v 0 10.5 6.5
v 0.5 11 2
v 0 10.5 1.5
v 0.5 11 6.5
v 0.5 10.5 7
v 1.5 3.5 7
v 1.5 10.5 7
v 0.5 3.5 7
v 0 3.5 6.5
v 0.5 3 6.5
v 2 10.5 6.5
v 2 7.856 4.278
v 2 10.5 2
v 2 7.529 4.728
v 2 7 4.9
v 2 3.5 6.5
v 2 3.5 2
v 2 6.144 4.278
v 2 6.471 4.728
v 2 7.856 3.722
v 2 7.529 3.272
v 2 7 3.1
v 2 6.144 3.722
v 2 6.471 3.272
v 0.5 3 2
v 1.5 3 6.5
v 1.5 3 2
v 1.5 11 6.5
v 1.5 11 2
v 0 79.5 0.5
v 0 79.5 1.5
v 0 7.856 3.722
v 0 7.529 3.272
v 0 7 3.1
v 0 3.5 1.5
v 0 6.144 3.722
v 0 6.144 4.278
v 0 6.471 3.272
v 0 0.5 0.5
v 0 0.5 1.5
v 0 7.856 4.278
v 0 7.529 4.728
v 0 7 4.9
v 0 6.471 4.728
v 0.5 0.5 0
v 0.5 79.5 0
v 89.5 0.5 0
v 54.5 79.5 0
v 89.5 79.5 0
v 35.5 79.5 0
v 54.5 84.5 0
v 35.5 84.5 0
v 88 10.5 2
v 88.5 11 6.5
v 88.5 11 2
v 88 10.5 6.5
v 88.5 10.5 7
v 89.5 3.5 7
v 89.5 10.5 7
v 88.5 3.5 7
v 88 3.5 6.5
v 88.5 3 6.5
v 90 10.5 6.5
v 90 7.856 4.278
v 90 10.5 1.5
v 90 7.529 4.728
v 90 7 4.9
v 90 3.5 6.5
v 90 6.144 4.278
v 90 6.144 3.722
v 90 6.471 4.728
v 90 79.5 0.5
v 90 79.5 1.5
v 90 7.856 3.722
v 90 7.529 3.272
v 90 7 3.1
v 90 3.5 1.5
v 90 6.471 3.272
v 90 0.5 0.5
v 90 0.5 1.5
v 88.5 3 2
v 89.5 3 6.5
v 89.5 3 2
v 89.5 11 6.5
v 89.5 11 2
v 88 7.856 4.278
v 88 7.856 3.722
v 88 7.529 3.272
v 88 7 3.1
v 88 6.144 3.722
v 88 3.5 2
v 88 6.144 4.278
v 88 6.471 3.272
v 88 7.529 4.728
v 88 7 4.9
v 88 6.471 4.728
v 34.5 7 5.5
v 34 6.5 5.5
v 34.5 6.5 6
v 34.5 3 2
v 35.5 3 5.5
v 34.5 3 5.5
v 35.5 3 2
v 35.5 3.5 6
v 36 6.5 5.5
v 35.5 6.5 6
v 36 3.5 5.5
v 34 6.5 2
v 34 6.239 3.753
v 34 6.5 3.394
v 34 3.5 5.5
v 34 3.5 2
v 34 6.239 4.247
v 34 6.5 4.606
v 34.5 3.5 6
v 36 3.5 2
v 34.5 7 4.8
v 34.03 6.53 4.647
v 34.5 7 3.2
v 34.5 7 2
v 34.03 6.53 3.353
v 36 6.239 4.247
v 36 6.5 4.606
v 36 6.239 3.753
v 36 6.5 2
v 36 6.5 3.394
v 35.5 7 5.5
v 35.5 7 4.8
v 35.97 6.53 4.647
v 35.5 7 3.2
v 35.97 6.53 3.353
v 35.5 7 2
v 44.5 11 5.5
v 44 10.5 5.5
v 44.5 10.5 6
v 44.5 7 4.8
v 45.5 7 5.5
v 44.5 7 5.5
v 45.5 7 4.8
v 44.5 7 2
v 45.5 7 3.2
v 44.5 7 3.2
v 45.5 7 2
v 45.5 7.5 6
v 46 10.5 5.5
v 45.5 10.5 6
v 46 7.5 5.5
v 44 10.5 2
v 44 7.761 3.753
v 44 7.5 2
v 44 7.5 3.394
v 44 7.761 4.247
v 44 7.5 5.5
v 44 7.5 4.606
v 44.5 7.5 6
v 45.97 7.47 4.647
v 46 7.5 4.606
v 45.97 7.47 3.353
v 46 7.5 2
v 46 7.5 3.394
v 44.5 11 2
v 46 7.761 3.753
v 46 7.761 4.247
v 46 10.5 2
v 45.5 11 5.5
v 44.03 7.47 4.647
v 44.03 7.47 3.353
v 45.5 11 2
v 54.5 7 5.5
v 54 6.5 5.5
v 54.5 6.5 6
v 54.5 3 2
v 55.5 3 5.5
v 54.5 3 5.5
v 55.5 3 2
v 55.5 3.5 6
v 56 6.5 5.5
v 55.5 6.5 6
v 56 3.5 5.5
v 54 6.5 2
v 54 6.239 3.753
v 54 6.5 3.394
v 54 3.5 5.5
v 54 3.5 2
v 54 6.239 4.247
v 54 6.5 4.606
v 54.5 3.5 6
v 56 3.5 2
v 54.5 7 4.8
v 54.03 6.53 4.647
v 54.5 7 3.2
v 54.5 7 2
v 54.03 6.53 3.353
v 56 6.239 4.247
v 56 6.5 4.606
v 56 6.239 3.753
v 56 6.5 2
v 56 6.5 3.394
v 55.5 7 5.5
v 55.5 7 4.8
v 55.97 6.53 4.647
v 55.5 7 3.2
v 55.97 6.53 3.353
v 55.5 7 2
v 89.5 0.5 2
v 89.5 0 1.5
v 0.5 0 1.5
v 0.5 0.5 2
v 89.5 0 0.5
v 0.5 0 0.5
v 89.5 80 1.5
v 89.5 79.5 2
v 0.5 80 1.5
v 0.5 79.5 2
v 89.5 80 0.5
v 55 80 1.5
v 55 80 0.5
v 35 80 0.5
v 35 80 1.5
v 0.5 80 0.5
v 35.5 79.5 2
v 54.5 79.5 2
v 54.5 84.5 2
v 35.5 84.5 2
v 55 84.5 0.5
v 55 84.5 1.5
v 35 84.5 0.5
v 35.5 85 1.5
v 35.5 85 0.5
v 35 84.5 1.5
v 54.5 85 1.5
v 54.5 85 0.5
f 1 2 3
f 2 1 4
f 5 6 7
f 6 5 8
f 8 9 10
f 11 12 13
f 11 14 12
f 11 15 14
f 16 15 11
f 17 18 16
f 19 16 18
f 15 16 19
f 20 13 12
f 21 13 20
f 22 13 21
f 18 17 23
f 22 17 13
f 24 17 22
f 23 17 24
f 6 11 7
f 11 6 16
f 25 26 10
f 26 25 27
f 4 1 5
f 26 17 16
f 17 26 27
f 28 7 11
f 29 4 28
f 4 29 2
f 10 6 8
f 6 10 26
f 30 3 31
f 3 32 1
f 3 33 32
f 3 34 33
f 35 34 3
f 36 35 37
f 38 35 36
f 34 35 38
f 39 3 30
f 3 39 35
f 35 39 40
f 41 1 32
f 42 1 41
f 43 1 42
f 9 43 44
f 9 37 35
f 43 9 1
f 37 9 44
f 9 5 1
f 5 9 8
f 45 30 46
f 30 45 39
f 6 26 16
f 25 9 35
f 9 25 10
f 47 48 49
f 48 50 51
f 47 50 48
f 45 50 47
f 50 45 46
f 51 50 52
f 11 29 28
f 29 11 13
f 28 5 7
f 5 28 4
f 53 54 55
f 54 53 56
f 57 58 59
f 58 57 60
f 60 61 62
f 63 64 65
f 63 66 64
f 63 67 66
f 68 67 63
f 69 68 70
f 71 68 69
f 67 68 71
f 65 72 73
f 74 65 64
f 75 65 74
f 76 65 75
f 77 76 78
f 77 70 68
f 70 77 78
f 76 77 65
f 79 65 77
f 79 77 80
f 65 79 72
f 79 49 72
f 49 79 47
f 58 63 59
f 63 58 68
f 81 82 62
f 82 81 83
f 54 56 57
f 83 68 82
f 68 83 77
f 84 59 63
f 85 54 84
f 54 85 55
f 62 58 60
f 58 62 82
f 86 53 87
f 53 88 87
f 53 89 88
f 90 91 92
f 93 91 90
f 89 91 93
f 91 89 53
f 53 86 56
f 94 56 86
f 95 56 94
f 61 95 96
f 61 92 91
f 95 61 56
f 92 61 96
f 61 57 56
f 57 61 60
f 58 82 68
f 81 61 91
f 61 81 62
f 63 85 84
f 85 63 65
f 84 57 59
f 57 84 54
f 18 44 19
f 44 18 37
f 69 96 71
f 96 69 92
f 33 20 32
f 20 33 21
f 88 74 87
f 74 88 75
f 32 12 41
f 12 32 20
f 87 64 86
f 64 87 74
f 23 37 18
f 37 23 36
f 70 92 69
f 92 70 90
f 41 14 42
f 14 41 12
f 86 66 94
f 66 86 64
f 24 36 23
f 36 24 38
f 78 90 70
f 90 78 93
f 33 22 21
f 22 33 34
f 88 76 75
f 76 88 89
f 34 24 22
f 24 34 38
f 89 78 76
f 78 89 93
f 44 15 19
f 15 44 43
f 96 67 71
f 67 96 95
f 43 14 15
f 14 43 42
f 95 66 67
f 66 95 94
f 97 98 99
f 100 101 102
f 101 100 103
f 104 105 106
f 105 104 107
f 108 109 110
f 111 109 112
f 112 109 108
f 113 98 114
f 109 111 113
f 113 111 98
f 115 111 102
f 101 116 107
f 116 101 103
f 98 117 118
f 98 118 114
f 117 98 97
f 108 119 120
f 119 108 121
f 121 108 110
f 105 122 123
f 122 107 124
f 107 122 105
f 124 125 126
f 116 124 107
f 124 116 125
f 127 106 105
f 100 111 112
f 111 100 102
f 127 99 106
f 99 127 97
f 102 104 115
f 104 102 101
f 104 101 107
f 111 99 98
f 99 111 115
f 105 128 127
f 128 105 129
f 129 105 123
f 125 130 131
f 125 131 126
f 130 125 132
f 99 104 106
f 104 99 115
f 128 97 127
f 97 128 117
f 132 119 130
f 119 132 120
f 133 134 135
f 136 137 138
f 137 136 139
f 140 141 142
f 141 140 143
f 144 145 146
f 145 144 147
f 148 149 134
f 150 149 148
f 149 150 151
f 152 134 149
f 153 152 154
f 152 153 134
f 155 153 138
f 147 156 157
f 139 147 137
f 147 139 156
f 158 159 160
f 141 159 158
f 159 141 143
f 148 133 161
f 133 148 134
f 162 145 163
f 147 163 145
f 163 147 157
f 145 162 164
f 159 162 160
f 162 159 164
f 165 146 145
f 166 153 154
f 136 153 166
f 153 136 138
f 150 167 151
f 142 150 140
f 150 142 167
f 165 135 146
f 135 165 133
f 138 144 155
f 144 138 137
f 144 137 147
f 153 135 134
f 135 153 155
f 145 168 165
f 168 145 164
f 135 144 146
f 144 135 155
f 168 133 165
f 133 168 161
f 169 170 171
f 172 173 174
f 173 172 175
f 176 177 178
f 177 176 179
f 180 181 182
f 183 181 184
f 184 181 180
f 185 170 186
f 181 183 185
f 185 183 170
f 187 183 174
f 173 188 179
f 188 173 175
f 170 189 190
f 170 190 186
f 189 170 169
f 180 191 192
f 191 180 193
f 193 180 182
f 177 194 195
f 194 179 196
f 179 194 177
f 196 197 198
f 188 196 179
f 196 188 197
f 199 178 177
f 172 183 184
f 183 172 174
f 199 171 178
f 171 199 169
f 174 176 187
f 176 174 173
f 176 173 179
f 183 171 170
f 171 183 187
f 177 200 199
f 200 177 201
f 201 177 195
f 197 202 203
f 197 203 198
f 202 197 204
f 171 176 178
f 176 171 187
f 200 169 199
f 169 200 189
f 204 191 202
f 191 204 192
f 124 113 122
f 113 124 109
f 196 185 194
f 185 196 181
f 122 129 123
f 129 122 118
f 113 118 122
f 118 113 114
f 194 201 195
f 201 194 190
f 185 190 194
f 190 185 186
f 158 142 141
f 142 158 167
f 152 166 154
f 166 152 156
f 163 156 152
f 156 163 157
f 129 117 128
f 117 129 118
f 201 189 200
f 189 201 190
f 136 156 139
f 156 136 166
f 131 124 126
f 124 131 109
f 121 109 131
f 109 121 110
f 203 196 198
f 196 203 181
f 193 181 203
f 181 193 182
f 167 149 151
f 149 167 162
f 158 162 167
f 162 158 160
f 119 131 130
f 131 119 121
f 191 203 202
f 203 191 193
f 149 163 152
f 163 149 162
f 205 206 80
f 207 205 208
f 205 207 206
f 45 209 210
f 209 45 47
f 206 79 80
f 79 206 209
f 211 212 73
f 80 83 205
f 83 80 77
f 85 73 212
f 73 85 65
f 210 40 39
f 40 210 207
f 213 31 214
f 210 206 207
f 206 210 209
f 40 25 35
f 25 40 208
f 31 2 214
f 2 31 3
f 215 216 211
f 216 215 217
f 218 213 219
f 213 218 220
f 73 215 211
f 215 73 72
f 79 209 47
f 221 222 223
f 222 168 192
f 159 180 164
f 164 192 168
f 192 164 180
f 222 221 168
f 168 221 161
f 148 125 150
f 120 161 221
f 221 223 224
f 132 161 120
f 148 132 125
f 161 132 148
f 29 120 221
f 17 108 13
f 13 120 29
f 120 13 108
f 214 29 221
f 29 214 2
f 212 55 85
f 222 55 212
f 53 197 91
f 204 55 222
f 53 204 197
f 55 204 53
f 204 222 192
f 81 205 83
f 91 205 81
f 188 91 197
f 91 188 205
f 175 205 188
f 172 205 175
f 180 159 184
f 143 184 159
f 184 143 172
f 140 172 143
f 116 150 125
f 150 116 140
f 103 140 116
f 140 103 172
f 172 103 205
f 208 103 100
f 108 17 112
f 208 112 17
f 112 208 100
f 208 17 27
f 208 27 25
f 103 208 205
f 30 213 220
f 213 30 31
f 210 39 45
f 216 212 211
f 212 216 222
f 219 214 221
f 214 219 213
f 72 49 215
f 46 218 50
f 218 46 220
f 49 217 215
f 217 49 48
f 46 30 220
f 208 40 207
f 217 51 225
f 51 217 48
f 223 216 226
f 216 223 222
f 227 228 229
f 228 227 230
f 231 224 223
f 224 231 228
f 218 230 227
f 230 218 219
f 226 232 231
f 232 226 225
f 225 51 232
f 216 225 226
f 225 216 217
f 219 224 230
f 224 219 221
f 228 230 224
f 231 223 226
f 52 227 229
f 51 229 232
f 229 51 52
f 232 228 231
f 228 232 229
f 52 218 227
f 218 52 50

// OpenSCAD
module nicebox(size)
{
    hull() {
        translate([0,0.5,0.5])
        cube(size - [0,1,1]);
        translate([0.5,0.5,0])
        cube(size - [1,1,0]);
        
        translate([0.5,0,0.5])
        cube(size - [1,0,1]);
    }
}


nicebox([90,80,2]);

translate([35,65,0])
    nicebox([20,20,2]);

difference() {
    union(){
        translate([0,3,0])
            nicebox([2,8,7]);
        translate([88,3,0])
            nicebox([2,8,7]);
    }
    translate([45,7,4])
    rotate([0,90,0])
        cylinder(d=1.8, h=200, center=true, $fn=10);
}


difference() {
    union(){
        translate([34,3,0])
            nicebox([2,4,6]);
        translate([44,7,0])
            nicebox([2,4,6]);
        translate([54,3,0])
            nicebox([2,4,6]);
    }
    translate([45,7,4])
    rotate([0,90,0])
        cylinder(d=1.6, h=200, center=true, $fn=10);
}
